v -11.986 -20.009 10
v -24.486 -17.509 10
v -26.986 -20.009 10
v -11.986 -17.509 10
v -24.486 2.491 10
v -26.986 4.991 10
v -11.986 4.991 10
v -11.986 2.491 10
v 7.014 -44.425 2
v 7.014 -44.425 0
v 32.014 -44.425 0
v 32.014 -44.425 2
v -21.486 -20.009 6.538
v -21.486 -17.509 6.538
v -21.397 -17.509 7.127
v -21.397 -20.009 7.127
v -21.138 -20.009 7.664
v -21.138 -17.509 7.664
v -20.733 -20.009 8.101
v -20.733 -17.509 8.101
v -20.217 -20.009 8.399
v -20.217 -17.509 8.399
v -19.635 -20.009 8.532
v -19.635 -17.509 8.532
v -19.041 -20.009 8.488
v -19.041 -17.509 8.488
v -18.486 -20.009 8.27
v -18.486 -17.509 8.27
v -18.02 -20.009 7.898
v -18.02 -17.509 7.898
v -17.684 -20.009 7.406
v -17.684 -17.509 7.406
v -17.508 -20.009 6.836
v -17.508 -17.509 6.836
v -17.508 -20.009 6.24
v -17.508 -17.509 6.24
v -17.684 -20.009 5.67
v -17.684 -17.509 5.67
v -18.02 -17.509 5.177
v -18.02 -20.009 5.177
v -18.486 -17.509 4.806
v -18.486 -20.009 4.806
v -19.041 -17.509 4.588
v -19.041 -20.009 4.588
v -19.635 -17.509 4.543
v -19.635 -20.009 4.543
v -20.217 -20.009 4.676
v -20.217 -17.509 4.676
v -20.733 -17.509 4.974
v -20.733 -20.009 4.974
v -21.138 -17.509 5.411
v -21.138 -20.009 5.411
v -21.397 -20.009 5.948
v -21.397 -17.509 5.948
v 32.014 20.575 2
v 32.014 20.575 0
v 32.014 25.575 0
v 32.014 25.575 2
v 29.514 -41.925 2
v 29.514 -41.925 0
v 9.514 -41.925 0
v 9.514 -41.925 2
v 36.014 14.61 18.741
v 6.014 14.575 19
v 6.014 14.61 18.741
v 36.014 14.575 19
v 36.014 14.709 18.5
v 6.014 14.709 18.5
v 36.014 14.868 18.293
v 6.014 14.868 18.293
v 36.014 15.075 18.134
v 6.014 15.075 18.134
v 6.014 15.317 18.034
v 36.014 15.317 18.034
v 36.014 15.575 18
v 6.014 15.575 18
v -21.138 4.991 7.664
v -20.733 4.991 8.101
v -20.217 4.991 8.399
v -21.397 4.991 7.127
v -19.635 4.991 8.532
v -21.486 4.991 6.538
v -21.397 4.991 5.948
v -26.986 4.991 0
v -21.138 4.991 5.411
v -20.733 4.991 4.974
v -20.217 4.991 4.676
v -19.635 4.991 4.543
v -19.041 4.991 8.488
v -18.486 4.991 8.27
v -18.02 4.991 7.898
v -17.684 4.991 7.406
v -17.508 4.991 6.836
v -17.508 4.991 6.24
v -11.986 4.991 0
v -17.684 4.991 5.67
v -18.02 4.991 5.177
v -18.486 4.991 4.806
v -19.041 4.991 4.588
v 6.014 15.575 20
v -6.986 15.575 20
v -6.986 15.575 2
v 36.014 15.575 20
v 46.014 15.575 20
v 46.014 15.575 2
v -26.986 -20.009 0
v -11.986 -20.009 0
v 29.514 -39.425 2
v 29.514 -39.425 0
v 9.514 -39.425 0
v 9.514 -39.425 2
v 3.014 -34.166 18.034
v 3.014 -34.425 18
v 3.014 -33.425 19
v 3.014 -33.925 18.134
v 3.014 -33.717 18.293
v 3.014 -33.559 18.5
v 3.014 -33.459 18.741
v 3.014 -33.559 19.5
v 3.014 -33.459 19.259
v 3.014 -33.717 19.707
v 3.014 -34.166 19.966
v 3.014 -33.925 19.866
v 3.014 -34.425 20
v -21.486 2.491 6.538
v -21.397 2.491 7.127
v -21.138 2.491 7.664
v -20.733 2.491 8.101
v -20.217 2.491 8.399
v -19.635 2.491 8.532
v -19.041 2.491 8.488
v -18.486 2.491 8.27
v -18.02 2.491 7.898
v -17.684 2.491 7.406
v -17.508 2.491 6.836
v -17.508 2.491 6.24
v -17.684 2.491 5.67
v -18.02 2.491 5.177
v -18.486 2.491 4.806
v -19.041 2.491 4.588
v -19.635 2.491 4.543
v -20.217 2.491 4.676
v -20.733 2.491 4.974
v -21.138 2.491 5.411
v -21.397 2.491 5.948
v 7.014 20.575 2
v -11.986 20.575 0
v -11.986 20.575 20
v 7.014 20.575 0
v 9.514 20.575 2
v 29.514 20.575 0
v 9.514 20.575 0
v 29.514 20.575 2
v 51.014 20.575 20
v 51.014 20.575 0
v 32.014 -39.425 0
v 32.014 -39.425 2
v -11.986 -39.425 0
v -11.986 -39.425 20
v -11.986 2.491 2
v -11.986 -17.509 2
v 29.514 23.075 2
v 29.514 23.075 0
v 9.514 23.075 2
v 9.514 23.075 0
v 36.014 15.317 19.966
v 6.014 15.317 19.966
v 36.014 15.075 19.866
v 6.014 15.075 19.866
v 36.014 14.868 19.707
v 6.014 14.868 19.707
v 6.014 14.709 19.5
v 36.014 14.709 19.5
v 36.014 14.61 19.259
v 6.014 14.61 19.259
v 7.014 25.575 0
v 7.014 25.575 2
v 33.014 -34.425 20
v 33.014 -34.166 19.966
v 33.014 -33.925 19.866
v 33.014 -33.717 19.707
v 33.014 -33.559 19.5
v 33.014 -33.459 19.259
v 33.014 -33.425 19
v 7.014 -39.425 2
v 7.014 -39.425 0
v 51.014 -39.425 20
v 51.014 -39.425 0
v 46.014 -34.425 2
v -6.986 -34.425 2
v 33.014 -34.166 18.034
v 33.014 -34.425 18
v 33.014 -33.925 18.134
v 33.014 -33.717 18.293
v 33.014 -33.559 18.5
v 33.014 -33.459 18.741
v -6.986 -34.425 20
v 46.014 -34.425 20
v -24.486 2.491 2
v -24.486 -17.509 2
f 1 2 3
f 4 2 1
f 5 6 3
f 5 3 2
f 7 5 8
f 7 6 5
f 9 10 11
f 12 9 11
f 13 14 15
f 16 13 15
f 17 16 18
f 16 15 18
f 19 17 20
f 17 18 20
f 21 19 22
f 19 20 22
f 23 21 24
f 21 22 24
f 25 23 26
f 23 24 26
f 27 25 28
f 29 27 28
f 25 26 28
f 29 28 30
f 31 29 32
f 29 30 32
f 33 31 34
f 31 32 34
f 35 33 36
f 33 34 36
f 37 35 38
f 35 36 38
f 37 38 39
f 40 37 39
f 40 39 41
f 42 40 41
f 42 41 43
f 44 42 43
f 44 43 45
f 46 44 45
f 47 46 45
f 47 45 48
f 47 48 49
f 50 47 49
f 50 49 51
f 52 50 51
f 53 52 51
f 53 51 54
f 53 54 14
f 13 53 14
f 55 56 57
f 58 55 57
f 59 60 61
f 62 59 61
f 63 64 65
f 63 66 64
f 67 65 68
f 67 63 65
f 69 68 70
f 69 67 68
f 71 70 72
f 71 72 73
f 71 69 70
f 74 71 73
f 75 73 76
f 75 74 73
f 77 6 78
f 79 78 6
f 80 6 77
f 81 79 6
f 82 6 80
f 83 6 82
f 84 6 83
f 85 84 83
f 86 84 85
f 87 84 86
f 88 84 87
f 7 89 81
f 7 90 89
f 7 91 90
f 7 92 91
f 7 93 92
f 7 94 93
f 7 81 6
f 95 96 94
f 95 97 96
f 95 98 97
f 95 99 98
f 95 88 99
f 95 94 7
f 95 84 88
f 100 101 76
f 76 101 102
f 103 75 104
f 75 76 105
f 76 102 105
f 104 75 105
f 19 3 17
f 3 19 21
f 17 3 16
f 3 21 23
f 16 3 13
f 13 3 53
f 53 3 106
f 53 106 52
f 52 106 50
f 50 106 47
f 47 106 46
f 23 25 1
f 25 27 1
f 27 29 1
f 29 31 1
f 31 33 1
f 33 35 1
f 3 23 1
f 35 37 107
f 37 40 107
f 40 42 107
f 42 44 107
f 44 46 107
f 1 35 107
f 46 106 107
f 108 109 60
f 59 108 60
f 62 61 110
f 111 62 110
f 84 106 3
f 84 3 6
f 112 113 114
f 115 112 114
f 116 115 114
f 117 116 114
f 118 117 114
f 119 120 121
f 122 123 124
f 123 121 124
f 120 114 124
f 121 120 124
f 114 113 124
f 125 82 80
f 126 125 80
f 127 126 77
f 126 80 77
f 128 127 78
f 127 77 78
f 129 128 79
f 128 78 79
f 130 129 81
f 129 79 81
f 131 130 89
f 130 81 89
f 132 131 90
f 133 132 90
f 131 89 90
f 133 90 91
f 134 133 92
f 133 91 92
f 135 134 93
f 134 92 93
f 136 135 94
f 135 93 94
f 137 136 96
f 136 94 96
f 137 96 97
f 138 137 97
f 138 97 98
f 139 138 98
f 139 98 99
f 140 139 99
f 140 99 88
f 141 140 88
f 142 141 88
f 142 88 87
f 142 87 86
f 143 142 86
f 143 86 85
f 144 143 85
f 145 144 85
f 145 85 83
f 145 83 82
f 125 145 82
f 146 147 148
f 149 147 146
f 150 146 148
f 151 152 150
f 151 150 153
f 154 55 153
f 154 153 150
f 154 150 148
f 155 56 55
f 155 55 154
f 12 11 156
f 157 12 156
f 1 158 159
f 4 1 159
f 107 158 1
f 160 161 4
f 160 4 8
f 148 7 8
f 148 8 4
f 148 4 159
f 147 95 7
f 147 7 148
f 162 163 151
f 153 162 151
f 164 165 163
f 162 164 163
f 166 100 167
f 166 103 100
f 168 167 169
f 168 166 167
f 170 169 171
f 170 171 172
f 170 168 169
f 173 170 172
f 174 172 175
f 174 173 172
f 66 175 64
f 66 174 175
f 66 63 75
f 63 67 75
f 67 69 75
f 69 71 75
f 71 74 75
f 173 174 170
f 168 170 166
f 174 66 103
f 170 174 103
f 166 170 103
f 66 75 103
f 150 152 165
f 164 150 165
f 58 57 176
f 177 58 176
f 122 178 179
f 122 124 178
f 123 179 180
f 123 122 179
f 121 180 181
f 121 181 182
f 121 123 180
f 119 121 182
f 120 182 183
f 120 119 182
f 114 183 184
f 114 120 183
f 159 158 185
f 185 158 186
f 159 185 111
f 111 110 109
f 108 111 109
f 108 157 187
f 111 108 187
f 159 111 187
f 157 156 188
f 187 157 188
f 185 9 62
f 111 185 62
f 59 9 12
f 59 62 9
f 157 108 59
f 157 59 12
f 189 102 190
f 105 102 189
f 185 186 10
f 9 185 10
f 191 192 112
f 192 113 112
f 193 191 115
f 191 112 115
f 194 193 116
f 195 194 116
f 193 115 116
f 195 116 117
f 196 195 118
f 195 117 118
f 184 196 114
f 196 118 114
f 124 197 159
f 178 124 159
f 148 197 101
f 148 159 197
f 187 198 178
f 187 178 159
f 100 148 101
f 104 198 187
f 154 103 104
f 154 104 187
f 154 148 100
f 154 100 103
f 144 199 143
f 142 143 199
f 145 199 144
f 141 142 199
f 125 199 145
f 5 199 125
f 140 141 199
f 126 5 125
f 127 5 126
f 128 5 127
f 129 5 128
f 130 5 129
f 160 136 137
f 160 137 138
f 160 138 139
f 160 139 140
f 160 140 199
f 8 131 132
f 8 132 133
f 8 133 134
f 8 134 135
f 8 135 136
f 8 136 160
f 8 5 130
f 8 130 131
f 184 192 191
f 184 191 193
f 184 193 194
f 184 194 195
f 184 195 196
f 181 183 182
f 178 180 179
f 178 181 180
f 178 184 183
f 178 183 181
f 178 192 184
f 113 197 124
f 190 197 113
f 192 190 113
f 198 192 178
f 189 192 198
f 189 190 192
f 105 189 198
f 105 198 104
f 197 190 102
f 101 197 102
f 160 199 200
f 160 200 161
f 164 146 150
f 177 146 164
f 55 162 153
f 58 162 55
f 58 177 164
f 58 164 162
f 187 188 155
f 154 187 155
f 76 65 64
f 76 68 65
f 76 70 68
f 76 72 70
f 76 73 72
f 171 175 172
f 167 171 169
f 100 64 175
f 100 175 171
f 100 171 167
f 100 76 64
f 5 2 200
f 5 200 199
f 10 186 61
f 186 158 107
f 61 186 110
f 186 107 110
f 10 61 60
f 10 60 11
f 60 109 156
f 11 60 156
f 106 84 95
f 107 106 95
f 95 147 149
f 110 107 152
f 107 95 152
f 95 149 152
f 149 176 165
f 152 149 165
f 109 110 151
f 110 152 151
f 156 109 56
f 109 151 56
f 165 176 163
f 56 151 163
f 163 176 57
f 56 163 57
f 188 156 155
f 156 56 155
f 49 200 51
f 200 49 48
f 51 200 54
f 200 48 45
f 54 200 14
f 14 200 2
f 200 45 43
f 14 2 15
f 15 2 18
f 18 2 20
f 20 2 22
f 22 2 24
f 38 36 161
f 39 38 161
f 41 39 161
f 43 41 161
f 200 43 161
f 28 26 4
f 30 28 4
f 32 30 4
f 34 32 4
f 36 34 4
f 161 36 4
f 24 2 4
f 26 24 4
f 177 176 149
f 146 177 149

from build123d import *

# Parameters (mm, degrees)
F0_W      = 63
F0_H      = 60
F0_W_2    = 53
F0_H_2    = 50
F1_DEPTH  = 20
F3_DEPTH  = 2
F4_DEPTH  = 2
F5_W      = 30
F5_H      = 2
F6_DEPTH  = 1
F7_W      = 30
F7_H      = 2
F8_DEPTH  = 1
F9_R      = 0.99999
F10_W     = 15
F10_H     = 25
F11_DEPTH = 10
F12_W     = 12.5
F12_H     = 20
F13_DEPTH = 8
F14_R     = 2
F15_DEPTH = 25


# Not quite as in the source:
# - a fillet or chamfer is up to 0.001 mm smaller than in the source, because OpenCascade refuses the exact size


with BuildPart() as f1:
    # F0 (on Top) → F1 (new body)
    with BuildSketch(Plane.XY):
        with Locations((19.5141504109, -9.4245311618)):
            Rectangle(F0_W, F0_H)
        with Locations((19.5141504109, -9.4245311618)):
            Rectangle(F0_W_2, F0_H_2, mode=Mode.SUBTRACT)
    extrude(amount=F1_DEPTH)

    # F2 (on Top) → F3 (join)
    with BuildSketch(Plane.XY):
        Polygon((7.0141504109, 25.5754688382), (7.0141504109, 20.5754688382), (9.5141504109, 20.5754688382), (9.5141504109, 23.0754688382), (29.5141504109, 23.0754688382), (29.5141504109, 20.5754688382), (32.0141504109, 20.5754688382), (32.0141504109, 25.5754688382), align=None)
        Polygon((9.5141504109, -39.4245311618), (7.0141504109, -39.4245311618), (7.0141504109, -44.4245311618), (32.0141504109, -44.4245311618), (32.0141504109, -39.4245311618), (29.5141504109, -39.4245311618), (29.5141504109, -41.9245311618), (9.5141504109, -41.9245311618), align=None)
    extrude(amount=F3_DEPTH)

    # F0 (on Top) → F4 (join)
    with BuildSketch(Plane.XY):
        with Locations((19.5141504109, -9.4245311618)):
            Rectangle(F0_W_2, F0_H_2)
    extrude(amount=F4_DEPTH)

    # F5 (on face) → F6 (join)
    with BuildSketch(Plane.XZ.offset(-15.5754688382)):
        with Locations((21.0141504109, 19)):
            Rectangle(F5_W, F5_H)
    extrude(amount=F6_DEPTH)

    # F7 (on face) → F8 (join)
    with BuildSketch(Plane(origin=(0, -34.4245311618, 0), x_dir=(-1, 0, 0), z_dir=(0, 1, 0))):
        with Locations((-18.0141504109, 19)):
            Rectangle(F7_W, F7_H)
    extrude(amount=F8_DEPTH)

    # F9 (radius 1 in the source; OpenCascade refuses exactly that, so slightly less here)
    f9_edges = [f1.edges().sort_by_distance(p)[0] for p in [
        (21.01415, 14.575469, 20),
        (21.01415, 14.575469, 18),
        (18.01415, -33.424531, 20),
        (18.01415, -33.424531, 18),
    ]]
    fillet(f9_edges, radius=F9_R)

    # F10 (on Top) → F11 (join)
    with BuildSketch(Plane.XY):
        with Locations((-19.4858495891, -7.5094338506)):
            Rectangle(F10_W, F10_H)
    extrude(amount=F11_DEPTH)

    # F12 (on face) → F13 (cut)
    with BuildSketch(Plane.XY.offset(10)):
        with Locations((-18.2358495891, -7.5094338506)):
            Rectangle(F12_W, F12_H)
    extrude(amount=-F13_DEPTH, mode=Mode.SUBTRACT)

    # F14 (on face) → F15 (cut)
    with BuildSketch(Plane(origin=(0, 4.9905661494, 0), x_dir=(-1, 0, 0), z_dir=(0, 1, 0))):
        with Locations((19.4858495891, 6.5377363935)):
            Circle(F14_R)
    extrude(amount=-F15_DEPTH, mode=Mode.SUBTRACT)


solid = f1.part
